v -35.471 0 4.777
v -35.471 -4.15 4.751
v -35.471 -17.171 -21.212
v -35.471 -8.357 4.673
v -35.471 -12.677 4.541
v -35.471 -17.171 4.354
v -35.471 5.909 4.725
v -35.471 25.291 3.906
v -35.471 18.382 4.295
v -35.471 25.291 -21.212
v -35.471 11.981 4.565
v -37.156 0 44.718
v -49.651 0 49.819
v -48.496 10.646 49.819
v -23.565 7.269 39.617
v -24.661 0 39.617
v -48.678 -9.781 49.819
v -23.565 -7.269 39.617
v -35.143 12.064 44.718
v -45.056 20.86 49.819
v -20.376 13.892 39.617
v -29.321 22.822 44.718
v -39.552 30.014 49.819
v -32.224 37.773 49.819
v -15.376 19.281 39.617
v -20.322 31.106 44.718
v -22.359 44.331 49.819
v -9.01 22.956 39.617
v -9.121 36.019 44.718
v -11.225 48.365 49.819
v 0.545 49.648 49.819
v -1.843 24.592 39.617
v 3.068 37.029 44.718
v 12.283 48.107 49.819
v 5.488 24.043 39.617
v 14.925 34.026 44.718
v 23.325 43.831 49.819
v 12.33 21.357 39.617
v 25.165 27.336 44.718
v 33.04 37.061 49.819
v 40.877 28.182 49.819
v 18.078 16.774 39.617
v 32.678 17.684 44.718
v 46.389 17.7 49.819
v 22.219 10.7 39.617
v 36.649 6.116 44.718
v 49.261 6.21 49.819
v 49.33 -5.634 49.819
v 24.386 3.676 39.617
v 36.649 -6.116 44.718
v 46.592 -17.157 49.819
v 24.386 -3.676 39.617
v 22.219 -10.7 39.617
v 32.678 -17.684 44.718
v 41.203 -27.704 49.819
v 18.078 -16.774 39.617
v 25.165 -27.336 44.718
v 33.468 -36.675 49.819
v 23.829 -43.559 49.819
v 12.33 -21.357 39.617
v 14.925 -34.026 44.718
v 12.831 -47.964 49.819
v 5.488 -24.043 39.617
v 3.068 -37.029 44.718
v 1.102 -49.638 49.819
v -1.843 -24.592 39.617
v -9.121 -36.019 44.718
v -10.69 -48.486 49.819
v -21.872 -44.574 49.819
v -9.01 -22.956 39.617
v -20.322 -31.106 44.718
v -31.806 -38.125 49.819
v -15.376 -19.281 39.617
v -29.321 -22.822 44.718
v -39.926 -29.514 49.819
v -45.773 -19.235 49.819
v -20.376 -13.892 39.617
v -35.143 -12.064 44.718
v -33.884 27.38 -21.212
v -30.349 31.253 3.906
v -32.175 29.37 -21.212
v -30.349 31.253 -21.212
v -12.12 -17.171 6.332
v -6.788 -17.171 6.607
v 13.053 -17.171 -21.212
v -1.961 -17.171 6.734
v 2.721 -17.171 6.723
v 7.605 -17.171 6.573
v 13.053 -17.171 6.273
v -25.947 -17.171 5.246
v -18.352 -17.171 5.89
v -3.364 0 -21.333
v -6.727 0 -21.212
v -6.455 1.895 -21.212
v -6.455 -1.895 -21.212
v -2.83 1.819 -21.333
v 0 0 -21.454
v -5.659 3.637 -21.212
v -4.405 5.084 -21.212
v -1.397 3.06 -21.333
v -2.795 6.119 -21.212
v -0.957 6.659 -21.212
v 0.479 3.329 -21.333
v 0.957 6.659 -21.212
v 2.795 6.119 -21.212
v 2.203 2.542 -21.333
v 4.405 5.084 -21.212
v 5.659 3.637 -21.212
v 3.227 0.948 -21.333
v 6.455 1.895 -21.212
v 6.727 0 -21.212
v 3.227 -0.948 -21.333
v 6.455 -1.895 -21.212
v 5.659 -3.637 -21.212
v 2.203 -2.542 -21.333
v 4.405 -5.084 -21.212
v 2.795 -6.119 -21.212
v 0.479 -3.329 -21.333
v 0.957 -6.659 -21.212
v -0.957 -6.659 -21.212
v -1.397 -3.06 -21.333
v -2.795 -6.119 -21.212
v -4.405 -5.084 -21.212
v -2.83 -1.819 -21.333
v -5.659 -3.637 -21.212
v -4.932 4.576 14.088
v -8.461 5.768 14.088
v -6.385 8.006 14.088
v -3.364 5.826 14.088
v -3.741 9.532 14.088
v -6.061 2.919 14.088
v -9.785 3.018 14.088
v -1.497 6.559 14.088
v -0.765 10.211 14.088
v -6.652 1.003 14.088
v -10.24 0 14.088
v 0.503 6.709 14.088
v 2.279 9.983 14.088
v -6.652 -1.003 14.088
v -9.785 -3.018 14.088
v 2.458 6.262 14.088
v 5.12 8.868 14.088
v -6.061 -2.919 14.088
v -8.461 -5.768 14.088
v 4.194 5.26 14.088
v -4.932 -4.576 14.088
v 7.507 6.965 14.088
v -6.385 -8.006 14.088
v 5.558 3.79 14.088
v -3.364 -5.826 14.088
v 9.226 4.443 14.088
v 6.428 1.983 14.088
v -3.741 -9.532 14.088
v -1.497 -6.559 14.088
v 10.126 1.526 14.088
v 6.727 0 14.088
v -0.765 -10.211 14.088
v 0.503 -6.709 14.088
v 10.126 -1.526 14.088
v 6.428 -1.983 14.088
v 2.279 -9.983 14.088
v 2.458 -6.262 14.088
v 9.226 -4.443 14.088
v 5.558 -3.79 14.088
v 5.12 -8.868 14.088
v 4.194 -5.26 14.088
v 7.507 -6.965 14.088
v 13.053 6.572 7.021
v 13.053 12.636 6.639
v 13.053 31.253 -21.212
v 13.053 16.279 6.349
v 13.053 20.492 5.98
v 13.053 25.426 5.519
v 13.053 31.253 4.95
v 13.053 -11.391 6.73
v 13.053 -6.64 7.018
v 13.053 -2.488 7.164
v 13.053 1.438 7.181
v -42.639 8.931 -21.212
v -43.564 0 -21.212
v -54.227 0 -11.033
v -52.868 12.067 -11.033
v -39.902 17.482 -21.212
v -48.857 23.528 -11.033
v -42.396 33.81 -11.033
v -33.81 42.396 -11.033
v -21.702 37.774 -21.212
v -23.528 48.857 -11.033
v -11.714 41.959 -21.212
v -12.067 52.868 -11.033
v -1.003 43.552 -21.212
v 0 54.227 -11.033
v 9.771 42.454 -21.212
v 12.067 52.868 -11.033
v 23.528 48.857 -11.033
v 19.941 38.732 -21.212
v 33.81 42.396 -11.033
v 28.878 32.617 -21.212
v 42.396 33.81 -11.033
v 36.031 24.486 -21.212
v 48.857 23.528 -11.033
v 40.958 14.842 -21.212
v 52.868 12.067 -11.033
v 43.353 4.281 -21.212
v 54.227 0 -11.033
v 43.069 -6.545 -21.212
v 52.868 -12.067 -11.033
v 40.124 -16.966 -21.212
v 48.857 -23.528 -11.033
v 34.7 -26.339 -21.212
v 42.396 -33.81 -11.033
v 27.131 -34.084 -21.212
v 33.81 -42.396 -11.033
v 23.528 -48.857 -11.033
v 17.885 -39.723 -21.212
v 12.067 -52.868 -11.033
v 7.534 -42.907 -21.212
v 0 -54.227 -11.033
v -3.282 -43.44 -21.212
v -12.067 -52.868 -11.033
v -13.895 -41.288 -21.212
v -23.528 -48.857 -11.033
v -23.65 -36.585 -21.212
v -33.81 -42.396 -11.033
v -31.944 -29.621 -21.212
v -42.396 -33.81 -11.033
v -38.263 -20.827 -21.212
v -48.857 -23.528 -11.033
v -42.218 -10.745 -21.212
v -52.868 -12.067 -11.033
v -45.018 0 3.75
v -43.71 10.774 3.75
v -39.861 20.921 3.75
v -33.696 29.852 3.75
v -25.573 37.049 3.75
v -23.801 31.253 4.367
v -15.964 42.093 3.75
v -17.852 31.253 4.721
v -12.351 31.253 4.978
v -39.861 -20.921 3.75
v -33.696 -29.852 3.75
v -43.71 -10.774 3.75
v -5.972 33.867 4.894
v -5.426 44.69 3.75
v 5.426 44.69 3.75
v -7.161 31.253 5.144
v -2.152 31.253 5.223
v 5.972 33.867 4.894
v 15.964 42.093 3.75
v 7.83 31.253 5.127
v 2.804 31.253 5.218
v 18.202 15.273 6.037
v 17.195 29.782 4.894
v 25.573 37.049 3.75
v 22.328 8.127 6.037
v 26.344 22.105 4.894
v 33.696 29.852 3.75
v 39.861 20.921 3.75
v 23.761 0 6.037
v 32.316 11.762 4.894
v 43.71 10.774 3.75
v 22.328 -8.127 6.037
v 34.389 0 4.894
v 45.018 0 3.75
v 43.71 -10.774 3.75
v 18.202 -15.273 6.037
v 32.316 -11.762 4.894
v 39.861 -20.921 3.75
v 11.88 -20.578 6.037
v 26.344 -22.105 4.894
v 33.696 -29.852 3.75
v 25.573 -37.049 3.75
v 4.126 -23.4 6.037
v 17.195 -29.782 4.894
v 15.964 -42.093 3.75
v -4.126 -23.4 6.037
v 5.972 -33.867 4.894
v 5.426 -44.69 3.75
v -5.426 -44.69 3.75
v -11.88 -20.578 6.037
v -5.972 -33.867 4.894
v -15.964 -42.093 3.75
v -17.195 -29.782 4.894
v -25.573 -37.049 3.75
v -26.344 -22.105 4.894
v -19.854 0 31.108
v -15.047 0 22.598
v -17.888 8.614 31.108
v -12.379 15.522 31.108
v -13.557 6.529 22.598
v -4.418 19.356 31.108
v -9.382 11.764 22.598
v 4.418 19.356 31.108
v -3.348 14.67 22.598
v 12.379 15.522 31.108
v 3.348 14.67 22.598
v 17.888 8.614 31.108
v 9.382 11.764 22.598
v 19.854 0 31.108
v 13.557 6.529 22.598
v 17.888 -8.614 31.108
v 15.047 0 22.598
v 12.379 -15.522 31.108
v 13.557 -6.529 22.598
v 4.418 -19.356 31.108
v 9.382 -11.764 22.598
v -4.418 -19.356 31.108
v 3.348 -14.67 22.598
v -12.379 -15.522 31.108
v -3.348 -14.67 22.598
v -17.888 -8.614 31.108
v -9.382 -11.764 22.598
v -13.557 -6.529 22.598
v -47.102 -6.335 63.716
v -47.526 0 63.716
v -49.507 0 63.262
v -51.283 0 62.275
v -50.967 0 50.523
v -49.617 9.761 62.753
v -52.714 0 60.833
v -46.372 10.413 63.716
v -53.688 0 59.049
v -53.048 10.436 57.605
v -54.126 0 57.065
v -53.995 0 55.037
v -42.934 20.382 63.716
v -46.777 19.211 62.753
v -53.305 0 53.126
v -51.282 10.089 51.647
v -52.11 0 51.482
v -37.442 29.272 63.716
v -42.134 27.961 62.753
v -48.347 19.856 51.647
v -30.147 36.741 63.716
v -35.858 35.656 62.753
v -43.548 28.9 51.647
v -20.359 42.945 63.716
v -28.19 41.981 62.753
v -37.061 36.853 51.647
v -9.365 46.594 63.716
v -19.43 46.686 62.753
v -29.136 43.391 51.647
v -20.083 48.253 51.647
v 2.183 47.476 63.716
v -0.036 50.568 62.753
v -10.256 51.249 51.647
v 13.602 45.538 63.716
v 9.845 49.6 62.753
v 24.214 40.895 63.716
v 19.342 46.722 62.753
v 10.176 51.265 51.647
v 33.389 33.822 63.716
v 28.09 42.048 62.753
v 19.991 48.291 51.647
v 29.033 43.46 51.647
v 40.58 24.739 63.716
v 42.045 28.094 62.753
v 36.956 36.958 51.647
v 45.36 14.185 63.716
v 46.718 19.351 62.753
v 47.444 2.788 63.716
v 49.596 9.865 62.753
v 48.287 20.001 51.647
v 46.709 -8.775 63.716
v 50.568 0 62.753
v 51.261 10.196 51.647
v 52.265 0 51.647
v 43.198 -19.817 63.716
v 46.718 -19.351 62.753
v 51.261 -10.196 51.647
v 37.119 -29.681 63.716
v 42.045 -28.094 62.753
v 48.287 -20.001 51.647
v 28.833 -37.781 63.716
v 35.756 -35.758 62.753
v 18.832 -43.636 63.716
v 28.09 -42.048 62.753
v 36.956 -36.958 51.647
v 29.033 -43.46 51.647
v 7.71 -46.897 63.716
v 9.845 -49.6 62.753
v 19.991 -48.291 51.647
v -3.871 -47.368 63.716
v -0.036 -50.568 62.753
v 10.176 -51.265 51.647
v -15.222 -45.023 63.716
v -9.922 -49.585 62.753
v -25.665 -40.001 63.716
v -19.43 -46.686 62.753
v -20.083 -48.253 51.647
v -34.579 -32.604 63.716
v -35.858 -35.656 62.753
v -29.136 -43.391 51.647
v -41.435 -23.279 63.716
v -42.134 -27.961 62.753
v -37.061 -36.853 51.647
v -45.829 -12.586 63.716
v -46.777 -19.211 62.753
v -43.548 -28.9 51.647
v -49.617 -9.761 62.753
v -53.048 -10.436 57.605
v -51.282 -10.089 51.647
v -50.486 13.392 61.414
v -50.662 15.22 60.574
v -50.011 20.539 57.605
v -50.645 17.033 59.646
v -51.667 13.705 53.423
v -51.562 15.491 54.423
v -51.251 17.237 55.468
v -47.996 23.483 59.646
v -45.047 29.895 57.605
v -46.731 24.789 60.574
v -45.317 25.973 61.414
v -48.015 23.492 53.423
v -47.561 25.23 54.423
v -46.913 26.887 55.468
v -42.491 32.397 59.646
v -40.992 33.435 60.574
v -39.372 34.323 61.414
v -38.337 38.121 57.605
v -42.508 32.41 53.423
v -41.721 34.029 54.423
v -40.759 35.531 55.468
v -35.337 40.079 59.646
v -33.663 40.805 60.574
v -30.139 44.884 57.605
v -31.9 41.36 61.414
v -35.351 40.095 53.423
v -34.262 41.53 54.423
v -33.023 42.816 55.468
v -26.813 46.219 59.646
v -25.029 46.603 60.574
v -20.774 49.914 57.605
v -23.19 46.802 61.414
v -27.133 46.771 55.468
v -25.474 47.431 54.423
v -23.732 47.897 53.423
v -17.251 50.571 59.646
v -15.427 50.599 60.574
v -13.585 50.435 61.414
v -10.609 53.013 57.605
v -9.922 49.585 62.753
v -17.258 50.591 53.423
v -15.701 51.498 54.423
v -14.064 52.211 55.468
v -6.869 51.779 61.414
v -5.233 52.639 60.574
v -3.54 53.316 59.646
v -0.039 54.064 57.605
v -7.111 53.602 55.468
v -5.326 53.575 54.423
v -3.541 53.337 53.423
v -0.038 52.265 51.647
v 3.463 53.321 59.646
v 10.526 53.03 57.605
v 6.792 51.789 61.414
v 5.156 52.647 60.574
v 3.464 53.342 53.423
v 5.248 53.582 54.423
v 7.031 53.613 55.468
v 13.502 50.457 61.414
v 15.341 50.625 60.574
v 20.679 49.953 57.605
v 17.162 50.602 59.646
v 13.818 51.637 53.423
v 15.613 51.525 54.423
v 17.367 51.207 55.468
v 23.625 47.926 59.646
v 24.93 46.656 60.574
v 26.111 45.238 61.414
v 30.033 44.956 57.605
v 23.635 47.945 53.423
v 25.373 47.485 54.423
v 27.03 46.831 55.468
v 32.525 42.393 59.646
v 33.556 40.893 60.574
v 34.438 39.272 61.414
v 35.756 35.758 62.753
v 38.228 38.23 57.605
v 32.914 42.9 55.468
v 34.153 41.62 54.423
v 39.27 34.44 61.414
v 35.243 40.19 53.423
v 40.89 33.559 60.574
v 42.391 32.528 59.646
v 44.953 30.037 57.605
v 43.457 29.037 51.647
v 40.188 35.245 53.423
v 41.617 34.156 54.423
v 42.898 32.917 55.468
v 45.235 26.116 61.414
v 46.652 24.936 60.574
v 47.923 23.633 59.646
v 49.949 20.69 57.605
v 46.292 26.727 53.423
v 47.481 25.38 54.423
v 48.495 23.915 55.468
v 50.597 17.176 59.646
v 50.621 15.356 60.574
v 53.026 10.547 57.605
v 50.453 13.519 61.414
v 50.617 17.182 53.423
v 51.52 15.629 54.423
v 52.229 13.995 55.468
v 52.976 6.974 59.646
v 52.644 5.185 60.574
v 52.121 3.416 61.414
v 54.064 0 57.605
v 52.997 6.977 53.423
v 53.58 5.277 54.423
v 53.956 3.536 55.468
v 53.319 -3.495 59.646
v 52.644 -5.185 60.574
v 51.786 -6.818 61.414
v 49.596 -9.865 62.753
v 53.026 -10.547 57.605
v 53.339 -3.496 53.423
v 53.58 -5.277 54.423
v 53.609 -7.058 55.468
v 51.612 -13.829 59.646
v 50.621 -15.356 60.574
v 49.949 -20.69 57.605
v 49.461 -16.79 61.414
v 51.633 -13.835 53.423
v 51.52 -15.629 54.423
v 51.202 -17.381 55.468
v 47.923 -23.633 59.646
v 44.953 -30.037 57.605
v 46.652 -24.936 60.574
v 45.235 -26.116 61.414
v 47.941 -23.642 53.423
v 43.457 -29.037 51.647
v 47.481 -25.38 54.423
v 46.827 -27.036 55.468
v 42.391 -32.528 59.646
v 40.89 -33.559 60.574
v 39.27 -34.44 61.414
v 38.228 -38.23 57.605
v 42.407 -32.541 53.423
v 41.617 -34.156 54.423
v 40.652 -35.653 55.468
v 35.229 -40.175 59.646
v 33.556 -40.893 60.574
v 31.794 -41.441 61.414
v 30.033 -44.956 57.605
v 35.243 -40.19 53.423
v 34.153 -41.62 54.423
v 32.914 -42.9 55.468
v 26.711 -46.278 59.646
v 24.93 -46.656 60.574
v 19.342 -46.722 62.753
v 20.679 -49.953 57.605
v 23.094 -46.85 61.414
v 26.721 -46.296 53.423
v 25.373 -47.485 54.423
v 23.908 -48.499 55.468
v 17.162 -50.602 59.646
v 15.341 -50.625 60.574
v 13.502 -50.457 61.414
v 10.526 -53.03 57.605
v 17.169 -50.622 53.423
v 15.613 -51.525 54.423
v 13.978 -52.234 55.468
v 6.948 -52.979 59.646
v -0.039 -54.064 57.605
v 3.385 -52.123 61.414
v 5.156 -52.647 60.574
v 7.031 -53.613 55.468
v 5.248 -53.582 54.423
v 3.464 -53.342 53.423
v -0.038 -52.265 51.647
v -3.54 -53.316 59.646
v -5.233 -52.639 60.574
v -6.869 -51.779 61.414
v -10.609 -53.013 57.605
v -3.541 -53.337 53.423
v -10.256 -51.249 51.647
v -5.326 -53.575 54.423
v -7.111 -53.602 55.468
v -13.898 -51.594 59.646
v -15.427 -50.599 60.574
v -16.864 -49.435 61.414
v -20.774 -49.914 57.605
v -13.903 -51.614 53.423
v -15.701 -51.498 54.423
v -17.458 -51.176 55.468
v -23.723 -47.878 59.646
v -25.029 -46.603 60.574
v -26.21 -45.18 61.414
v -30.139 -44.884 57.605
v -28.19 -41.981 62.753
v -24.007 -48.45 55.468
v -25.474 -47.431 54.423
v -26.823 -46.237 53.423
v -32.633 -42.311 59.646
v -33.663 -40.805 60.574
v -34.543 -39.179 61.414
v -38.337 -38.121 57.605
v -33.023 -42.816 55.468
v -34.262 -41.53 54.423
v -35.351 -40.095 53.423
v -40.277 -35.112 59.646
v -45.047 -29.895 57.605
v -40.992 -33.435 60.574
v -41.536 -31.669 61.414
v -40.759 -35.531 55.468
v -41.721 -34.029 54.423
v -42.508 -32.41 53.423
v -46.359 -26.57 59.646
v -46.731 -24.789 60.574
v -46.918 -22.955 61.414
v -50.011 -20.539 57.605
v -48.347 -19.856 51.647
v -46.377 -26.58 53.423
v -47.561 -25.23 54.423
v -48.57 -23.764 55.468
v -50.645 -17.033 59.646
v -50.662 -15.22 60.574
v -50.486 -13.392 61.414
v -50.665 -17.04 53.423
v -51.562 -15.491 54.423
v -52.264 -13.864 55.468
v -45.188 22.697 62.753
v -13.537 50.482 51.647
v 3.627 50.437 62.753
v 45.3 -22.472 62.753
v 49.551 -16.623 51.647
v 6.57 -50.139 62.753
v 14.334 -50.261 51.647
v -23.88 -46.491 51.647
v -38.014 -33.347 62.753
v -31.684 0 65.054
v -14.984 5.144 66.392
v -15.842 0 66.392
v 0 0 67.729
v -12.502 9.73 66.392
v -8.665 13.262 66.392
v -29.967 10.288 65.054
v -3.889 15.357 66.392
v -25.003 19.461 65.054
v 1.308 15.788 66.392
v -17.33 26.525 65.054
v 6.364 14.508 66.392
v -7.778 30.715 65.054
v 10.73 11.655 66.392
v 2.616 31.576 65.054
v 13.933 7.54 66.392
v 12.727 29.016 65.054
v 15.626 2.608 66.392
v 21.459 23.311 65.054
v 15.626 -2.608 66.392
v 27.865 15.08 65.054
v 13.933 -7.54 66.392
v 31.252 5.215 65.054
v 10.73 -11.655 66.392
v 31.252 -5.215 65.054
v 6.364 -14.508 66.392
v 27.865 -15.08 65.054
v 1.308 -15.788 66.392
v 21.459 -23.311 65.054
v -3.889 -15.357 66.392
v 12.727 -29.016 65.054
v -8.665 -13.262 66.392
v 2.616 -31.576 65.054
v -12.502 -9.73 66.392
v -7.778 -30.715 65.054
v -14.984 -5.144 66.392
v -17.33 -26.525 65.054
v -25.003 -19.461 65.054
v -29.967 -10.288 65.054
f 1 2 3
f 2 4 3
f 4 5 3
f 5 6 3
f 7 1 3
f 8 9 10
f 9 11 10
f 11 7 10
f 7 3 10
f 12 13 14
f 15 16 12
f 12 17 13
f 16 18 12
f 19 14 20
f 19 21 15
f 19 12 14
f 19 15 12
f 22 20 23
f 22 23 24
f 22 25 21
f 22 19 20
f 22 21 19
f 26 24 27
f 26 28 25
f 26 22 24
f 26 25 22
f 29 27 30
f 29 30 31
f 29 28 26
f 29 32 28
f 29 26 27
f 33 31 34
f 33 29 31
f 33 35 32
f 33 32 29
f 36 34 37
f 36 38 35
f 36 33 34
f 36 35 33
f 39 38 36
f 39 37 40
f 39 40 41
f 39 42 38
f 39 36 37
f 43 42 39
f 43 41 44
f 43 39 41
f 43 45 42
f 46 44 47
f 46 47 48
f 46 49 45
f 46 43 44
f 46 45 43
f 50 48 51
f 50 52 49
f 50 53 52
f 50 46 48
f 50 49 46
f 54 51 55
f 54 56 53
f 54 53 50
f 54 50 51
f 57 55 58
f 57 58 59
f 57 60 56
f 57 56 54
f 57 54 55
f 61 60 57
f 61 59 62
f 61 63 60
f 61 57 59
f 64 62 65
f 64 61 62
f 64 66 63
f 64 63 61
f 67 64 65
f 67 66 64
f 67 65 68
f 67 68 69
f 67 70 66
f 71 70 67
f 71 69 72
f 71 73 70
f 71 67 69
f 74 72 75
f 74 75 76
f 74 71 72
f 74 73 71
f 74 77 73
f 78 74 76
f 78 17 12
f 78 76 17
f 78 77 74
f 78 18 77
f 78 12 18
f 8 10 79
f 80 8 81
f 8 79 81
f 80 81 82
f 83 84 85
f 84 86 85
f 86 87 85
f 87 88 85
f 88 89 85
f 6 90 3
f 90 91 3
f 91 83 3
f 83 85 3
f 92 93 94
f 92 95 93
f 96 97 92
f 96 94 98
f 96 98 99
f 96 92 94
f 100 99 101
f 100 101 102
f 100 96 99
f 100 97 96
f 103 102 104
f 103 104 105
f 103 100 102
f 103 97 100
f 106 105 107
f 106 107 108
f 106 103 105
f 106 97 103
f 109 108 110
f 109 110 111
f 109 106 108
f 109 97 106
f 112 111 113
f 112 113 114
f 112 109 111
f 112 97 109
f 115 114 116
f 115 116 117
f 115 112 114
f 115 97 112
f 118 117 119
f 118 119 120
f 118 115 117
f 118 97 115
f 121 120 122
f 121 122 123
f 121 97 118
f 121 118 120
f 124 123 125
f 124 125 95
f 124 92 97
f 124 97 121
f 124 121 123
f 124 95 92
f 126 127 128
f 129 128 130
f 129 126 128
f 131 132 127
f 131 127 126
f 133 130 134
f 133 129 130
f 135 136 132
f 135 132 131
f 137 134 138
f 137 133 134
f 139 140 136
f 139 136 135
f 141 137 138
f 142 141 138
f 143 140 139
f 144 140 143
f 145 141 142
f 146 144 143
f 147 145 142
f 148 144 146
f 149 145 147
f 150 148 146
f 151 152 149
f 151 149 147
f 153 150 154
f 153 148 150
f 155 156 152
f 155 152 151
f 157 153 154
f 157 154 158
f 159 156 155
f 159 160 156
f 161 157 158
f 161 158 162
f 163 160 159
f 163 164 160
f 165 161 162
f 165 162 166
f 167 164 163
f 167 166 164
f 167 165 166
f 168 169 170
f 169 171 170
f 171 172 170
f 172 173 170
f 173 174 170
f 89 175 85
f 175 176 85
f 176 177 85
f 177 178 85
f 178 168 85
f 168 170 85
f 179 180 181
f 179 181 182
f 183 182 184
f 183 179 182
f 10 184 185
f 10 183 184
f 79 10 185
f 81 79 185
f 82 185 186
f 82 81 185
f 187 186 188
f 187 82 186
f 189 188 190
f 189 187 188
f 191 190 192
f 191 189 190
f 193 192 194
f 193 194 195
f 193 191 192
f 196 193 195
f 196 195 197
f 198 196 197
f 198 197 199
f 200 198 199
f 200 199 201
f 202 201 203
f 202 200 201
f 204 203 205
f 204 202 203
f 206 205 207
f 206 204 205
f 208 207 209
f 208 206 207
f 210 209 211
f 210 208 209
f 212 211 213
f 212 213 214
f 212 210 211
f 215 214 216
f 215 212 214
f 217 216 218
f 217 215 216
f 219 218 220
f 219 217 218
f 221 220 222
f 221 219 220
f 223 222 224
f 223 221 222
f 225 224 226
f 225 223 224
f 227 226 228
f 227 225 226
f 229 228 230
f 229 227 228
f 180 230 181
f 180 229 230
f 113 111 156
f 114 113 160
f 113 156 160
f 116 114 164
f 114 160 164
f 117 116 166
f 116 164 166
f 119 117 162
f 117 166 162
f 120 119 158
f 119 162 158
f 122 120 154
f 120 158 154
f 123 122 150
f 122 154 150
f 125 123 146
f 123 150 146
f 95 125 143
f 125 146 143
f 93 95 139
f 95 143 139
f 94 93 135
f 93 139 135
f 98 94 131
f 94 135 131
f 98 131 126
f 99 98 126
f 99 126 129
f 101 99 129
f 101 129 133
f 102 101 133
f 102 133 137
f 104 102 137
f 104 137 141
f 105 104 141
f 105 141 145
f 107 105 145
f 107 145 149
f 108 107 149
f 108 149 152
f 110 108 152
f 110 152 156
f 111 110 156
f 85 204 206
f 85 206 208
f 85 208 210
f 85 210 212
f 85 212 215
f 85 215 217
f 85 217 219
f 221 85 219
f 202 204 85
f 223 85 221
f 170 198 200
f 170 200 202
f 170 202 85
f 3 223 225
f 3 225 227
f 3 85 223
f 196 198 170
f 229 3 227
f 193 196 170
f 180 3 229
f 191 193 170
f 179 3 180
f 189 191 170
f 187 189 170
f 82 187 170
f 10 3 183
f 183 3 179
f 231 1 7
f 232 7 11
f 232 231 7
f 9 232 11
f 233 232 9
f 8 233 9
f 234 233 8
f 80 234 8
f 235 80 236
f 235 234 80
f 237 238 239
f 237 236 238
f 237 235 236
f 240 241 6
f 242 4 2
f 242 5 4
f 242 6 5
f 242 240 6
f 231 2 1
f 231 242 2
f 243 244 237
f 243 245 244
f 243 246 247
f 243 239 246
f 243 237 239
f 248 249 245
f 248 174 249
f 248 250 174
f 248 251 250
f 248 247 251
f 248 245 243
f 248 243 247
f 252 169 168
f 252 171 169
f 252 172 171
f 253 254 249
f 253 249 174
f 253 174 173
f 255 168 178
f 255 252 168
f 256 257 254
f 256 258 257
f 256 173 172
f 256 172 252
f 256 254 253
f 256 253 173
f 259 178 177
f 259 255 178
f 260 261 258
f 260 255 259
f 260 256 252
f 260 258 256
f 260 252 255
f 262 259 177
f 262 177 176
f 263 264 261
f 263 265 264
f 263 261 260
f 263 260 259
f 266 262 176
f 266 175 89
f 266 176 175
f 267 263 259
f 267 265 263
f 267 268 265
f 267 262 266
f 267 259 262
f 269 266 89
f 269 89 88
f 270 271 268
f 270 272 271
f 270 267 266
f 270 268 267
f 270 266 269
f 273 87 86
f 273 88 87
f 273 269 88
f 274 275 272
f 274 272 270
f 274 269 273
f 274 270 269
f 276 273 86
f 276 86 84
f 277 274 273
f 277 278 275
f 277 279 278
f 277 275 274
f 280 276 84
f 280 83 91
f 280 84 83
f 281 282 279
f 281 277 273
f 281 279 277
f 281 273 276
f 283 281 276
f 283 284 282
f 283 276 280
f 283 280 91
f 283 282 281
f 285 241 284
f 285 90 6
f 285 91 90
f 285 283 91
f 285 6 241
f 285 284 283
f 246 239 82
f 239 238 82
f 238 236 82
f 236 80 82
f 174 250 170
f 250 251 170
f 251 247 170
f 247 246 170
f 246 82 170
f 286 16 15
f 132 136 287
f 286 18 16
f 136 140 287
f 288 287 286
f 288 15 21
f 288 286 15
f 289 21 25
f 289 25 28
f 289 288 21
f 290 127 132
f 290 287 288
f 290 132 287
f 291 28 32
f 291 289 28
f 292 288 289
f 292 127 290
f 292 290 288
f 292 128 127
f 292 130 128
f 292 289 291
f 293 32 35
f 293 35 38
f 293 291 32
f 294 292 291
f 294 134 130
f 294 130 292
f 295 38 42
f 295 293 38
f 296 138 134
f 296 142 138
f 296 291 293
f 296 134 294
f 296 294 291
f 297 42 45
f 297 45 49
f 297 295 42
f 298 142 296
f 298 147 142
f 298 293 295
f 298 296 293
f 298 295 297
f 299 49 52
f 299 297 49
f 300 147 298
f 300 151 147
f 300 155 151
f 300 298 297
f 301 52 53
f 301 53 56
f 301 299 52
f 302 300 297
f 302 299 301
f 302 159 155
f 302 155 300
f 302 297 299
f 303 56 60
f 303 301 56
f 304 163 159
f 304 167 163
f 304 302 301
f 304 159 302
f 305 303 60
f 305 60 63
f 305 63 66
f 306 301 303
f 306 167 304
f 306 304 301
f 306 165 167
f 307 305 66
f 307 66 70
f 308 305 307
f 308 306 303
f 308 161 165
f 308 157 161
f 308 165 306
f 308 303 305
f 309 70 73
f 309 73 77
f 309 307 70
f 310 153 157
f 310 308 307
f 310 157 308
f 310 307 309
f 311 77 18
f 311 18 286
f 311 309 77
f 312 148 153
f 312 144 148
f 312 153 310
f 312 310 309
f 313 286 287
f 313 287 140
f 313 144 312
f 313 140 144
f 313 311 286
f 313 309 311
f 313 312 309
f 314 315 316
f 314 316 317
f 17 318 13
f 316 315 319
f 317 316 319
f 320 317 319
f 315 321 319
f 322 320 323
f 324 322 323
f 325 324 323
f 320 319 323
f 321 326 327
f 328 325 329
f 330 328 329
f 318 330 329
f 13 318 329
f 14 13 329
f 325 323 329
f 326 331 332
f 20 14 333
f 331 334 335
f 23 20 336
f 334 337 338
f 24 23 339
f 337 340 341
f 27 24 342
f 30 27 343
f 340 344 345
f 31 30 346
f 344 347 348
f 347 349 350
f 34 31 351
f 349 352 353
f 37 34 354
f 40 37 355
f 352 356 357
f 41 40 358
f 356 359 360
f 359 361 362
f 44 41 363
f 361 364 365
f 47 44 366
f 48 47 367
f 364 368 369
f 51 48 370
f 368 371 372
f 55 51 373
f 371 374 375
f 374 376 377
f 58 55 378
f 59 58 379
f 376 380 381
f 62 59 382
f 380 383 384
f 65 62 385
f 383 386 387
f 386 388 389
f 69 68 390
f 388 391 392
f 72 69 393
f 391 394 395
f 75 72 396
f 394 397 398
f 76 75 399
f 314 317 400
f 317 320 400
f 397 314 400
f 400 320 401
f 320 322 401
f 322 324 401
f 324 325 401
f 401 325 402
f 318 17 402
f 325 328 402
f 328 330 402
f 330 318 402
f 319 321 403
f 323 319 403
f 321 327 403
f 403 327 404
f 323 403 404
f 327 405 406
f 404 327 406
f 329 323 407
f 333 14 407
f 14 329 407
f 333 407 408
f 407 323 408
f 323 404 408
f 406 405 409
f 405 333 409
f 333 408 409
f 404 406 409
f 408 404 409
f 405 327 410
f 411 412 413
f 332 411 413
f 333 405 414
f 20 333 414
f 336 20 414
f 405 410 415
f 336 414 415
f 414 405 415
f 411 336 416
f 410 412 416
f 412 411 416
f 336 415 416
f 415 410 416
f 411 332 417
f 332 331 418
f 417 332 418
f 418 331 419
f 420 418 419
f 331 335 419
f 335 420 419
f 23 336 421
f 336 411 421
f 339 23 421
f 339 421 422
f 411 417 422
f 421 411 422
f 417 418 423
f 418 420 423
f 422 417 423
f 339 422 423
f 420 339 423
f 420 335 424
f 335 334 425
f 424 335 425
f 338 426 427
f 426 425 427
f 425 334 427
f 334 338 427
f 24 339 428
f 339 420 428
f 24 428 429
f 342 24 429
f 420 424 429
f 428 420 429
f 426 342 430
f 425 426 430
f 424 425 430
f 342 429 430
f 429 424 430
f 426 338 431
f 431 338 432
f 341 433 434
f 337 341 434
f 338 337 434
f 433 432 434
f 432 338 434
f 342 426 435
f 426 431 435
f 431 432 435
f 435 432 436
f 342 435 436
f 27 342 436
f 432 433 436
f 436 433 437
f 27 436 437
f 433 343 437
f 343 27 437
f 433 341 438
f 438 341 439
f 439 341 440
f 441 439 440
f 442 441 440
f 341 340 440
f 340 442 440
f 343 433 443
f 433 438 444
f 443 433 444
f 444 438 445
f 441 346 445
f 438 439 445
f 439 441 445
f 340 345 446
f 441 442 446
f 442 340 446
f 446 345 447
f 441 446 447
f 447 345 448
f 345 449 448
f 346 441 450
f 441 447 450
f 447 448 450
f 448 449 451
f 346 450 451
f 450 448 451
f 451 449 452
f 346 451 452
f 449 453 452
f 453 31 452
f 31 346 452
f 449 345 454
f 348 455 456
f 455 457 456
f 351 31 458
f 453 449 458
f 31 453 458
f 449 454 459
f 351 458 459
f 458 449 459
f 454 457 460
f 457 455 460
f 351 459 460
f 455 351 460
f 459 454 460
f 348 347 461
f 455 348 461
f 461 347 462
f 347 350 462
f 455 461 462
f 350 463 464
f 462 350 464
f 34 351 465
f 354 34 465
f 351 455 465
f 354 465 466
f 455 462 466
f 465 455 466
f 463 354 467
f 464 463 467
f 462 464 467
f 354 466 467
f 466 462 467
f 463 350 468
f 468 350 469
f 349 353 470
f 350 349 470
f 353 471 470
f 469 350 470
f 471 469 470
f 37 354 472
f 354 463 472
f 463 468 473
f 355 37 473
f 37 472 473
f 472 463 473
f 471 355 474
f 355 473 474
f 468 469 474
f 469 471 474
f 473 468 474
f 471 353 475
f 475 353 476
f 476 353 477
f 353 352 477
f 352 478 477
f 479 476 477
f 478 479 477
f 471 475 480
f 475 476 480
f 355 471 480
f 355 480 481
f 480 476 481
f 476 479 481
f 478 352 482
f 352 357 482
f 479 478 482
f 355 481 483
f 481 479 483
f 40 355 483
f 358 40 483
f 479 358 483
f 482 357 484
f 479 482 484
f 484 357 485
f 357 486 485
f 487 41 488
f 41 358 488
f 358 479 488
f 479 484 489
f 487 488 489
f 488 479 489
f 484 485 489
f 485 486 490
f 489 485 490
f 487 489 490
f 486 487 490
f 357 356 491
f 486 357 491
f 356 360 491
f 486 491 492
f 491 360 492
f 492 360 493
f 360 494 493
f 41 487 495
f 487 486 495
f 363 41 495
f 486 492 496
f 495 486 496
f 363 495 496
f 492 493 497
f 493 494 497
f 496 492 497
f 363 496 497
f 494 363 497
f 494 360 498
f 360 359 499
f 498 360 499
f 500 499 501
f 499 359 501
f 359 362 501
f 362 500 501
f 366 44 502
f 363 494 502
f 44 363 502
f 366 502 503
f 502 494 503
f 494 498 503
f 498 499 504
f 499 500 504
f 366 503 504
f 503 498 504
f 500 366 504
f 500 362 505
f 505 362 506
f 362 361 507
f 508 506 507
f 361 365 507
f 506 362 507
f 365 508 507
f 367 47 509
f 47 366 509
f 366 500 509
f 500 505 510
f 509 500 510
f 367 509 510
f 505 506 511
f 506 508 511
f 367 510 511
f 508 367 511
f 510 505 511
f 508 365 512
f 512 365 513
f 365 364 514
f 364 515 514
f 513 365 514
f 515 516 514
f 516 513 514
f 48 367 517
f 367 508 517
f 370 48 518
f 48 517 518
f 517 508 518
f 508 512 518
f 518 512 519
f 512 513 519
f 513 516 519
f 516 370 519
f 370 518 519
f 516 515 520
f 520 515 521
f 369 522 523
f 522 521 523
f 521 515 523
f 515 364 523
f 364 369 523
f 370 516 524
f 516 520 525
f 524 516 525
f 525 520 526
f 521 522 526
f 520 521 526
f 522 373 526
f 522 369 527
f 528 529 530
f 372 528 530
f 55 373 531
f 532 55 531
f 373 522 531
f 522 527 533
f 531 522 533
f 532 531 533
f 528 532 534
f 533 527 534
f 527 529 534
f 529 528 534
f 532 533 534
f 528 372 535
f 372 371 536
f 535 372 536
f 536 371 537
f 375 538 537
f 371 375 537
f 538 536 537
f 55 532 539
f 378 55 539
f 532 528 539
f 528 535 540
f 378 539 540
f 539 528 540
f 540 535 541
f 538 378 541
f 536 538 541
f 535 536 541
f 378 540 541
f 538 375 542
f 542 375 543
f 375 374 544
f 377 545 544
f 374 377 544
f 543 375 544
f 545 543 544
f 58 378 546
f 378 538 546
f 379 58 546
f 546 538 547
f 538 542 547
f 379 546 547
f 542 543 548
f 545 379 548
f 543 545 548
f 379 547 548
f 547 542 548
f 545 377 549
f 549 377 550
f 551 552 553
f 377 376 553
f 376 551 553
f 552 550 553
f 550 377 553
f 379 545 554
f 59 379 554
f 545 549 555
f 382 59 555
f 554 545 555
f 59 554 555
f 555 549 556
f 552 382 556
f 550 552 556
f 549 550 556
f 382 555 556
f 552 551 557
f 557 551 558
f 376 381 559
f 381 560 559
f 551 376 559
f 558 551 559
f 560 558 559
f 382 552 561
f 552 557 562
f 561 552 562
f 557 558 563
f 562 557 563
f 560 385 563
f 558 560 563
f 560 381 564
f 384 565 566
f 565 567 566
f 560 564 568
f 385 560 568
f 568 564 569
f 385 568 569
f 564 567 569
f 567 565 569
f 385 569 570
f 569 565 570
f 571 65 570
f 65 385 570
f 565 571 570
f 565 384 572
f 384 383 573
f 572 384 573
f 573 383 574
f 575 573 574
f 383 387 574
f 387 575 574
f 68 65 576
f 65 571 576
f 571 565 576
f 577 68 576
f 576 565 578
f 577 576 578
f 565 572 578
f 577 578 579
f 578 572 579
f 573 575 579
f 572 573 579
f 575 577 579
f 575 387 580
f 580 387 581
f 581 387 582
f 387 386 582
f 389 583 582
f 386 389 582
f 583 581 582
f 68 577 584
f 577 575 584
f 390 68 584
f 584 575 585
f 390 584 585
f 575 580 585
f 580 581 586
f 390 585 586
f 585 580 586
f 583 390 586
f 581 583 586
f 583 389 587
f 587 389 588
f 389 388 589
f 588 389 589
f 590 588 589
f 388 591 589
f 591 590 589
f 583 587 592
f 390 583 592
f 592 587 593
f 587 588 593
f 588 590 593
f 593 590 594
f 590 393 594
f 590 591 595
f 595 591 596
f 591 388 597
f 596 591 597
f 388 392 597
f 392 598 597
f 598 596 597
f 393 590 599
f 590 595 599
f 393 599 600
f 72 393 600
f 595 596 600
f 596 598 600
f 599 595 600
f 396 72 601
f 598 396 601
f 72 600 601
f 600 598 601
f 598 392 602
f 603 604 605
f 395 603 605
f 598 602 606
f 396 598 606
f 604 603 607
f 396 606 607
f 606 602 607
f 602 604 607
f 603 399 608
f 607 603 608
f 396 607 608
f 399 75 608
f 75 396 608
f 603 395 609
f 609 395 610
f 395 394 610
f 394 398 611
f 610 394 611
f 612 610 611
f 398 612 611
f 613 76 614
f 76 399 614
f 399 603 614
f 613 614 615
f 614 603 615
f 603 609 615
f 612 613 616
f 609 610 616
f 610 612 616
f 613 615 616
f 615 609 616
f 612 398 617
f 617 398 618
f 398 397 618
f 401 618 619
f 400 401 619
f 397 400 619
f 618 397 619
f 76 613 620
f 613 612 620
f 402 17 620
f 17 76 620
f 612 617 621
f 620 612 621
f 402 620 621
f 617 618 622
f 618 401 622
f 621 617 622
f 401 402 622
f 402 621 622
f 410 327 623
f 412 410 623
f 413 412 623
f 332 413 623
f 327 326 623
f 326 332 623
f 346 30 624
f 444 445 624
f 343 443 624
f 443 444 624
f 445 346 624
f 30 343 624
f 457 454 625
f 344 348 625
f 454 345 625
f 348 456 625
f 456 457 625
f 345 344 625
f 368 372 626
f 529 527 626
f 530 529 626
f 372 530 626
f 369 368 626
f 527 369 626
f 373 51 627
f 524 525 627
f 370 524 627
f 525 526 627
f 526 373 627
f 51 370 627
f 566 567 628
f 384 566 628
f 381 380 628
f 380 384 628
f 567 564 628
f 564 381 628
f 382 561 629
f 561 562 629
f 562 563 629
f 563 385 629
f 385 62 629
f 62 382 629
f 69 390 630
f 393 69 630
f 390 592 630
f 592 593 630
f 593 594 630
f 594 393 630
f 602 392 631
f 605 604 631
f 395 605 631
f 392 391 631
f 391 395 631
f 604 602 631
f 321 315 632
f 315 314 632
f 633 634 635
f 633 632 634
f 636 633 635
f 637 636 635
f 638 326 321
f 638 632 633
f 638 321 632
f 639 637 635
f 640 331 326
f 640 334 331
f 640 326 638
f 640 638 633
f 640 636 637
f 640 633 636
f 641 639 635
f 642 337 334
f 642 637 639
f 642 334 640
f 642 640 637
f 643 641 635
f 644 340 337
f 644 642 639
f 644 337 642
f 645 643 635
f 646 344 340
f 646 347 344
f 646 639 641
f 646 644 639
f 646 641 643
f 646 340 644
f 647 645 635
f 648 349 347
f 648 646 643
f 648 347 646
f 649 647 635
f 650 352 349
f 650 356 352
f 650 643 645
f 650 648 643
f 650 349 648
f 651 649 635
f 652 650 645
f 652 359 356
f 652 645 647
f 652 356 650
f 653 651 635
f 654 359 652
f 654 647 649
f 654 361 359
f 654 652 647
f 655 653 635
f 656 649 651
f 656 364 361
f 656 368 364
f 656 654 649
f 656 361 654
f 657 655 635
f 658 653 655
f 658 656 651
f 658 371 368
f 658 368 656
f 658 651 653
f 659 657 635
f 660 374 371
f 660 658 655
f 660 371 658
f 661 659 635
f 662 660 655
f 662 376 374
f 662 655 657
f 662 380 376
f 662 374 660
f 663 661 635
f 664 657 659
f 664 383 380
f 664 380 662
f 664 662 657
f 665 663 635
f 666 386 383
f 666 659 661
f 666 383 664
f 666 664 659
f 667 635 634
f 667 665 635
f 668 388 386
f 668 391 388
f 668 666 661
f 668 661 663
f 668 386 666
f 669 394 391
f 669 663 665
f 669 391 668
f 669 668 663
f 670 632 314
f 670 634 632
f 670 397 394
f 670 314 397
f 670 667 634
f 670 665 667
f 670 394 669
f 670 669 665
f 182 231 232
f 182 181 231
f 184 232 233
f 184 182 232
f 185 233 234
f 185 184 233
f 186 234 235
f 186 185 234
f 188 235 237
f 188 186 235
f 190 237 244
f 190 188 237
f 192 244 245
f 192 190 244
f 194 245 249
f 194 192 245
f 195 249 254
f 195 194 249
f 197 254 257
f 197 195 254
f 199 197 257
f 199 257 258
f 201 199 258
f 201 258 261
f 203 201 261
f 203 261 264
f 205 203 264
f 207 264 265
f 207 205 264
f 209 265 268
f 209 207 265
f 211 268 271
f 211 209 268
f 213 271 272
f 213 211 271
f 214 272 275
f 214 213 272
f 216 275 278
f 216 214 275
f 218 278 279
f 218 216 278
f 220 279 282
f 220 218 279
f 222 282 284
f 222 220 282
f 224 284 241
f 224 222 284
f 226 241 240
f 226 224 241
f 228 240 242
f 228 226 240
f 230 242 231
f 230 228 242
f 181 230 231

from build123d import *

# Parameters (mm, degrees)
F2_R     = 7.2294051774
F3_R     = 6.7273611203
F4_DEPTH = 35.3


with BuildPart() as f1:
    # F0 (on Front) → F1 (revolve)
    with BuildSketch(Plane.XZ):
        Polygon((-43.5639172792, -21.2115701288), (-6.7273611203, -21.2115701288), (0, -21.4539151639), (0, 67.7293241024), (-77.492326498, 61.1859895289), (-24.6609486639, 39.6172180772), (-6.7273611203, 7.8699216247), (-45.017991215, 3.7500439212), (-54.2271323502, -11.0330488533), align=None)
    revolve(axis=Axis((0, 0, 23.1377044693), (0, 0, -1)))

    # F2
    f2_edges = [f1.edges().sort_by_distance(p)[0] for p in [
        (77.492326, 0, 61.18599),
    ]]
    fillet(f2_edges, radius=F2_R)

    # F3 (on face) → F4 (cut, symmetric)
    with BuildSketch(Plane(origin=(0, 0, -21.2115701288), x_dir=(1, 0, 0), z_dir=(0, 0, -1))):
        with BuildLine():
            Line((-30.3486299041, -31.2534086406), (13.0534712225, -31.2534086406))
            Line((13.0534712225, -31.2534086406), (13.0534712225, 17.1710327268))
            Line((13.0534712225, 17.1710327268), (-35.4708246887, 17.1710327268))
            Line((-35.4708246887, 17.1710327268), (-35.4708246887, -25.2910158874))
            ThreePointArc((-35.4708246887, -25.2910158874), (-33.0444803645, -28.3879764364), (-30.3486299041, -31.2534086406))
        make_face()
        Circle(F3_R, mode=Mode.SUBTRACT)
    extrude(amount=F4_DEPTH, both=True, mode=Mode.SUBTRACT)


solid = f1.part
